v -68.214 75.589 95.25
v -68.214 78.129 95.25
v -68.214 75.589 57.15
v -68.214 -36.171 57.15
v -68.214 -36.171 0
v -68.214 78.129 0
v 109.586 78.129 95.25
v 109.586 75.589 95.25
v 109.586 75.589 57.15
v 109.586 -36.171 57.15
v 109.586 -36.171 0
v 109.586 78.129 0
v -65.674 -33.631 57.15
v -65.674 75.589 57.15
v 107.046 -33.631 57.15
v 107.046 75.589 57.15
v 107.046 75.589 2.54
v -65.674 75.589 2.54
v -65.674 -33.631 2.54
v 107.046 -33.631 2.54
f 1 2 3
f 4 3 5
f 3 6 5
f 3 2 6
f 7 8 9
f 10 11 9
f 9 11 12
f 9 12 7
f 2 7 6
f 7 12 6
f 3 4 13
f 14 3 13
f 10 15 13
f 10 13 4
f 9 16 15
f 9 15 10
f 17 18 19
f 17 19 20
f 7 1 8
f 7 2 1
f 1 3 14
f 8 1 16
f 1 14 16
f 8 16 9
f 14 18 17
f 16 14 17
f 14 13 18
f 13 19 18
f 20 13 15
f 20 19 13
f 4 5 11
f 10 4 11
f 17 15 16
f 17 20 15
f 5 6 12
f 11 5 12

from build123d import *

# Parameters (mm, degrees)
F0_W     = 177.8
F0_H     = 114.3
F1_DEPTH = 57.15
F2_T     = -2.54
F4_DEPTH = 38.1


with BuildPart() as f1:
    # F0 (on Top) → F1 (new body)
    with BuildSketch(Plane.XY):
        with Locations((20.6855162978, 20.978878082)):
            Rectangle(F0_W, F0_H)
    extrude(amount=F1_DEPTH)

    # F2
    f2_openings = [f1.faces().sort_by_distance(p)[0] for p in [
        (20.685516, 20.978878, 57.15),
    ]]
    offset(amount=F2_T, openings=f2_openings)

    # F3 (on face) → F4 (join)
    with BuildSketch(Plane.XY.offset(57.15)):
        Polygon((-68.2144837022, 75.588878082), (-65.6744837022, 75.588878082), (107.0455162978, 75.588878082), (109.5855162978, 75.588878082), (109.5855162978, 78.128878082), (-68.2144837022, 78.128878082), align=None)
    extrude(amount=F4_DEPTH)


solid = f1.part
